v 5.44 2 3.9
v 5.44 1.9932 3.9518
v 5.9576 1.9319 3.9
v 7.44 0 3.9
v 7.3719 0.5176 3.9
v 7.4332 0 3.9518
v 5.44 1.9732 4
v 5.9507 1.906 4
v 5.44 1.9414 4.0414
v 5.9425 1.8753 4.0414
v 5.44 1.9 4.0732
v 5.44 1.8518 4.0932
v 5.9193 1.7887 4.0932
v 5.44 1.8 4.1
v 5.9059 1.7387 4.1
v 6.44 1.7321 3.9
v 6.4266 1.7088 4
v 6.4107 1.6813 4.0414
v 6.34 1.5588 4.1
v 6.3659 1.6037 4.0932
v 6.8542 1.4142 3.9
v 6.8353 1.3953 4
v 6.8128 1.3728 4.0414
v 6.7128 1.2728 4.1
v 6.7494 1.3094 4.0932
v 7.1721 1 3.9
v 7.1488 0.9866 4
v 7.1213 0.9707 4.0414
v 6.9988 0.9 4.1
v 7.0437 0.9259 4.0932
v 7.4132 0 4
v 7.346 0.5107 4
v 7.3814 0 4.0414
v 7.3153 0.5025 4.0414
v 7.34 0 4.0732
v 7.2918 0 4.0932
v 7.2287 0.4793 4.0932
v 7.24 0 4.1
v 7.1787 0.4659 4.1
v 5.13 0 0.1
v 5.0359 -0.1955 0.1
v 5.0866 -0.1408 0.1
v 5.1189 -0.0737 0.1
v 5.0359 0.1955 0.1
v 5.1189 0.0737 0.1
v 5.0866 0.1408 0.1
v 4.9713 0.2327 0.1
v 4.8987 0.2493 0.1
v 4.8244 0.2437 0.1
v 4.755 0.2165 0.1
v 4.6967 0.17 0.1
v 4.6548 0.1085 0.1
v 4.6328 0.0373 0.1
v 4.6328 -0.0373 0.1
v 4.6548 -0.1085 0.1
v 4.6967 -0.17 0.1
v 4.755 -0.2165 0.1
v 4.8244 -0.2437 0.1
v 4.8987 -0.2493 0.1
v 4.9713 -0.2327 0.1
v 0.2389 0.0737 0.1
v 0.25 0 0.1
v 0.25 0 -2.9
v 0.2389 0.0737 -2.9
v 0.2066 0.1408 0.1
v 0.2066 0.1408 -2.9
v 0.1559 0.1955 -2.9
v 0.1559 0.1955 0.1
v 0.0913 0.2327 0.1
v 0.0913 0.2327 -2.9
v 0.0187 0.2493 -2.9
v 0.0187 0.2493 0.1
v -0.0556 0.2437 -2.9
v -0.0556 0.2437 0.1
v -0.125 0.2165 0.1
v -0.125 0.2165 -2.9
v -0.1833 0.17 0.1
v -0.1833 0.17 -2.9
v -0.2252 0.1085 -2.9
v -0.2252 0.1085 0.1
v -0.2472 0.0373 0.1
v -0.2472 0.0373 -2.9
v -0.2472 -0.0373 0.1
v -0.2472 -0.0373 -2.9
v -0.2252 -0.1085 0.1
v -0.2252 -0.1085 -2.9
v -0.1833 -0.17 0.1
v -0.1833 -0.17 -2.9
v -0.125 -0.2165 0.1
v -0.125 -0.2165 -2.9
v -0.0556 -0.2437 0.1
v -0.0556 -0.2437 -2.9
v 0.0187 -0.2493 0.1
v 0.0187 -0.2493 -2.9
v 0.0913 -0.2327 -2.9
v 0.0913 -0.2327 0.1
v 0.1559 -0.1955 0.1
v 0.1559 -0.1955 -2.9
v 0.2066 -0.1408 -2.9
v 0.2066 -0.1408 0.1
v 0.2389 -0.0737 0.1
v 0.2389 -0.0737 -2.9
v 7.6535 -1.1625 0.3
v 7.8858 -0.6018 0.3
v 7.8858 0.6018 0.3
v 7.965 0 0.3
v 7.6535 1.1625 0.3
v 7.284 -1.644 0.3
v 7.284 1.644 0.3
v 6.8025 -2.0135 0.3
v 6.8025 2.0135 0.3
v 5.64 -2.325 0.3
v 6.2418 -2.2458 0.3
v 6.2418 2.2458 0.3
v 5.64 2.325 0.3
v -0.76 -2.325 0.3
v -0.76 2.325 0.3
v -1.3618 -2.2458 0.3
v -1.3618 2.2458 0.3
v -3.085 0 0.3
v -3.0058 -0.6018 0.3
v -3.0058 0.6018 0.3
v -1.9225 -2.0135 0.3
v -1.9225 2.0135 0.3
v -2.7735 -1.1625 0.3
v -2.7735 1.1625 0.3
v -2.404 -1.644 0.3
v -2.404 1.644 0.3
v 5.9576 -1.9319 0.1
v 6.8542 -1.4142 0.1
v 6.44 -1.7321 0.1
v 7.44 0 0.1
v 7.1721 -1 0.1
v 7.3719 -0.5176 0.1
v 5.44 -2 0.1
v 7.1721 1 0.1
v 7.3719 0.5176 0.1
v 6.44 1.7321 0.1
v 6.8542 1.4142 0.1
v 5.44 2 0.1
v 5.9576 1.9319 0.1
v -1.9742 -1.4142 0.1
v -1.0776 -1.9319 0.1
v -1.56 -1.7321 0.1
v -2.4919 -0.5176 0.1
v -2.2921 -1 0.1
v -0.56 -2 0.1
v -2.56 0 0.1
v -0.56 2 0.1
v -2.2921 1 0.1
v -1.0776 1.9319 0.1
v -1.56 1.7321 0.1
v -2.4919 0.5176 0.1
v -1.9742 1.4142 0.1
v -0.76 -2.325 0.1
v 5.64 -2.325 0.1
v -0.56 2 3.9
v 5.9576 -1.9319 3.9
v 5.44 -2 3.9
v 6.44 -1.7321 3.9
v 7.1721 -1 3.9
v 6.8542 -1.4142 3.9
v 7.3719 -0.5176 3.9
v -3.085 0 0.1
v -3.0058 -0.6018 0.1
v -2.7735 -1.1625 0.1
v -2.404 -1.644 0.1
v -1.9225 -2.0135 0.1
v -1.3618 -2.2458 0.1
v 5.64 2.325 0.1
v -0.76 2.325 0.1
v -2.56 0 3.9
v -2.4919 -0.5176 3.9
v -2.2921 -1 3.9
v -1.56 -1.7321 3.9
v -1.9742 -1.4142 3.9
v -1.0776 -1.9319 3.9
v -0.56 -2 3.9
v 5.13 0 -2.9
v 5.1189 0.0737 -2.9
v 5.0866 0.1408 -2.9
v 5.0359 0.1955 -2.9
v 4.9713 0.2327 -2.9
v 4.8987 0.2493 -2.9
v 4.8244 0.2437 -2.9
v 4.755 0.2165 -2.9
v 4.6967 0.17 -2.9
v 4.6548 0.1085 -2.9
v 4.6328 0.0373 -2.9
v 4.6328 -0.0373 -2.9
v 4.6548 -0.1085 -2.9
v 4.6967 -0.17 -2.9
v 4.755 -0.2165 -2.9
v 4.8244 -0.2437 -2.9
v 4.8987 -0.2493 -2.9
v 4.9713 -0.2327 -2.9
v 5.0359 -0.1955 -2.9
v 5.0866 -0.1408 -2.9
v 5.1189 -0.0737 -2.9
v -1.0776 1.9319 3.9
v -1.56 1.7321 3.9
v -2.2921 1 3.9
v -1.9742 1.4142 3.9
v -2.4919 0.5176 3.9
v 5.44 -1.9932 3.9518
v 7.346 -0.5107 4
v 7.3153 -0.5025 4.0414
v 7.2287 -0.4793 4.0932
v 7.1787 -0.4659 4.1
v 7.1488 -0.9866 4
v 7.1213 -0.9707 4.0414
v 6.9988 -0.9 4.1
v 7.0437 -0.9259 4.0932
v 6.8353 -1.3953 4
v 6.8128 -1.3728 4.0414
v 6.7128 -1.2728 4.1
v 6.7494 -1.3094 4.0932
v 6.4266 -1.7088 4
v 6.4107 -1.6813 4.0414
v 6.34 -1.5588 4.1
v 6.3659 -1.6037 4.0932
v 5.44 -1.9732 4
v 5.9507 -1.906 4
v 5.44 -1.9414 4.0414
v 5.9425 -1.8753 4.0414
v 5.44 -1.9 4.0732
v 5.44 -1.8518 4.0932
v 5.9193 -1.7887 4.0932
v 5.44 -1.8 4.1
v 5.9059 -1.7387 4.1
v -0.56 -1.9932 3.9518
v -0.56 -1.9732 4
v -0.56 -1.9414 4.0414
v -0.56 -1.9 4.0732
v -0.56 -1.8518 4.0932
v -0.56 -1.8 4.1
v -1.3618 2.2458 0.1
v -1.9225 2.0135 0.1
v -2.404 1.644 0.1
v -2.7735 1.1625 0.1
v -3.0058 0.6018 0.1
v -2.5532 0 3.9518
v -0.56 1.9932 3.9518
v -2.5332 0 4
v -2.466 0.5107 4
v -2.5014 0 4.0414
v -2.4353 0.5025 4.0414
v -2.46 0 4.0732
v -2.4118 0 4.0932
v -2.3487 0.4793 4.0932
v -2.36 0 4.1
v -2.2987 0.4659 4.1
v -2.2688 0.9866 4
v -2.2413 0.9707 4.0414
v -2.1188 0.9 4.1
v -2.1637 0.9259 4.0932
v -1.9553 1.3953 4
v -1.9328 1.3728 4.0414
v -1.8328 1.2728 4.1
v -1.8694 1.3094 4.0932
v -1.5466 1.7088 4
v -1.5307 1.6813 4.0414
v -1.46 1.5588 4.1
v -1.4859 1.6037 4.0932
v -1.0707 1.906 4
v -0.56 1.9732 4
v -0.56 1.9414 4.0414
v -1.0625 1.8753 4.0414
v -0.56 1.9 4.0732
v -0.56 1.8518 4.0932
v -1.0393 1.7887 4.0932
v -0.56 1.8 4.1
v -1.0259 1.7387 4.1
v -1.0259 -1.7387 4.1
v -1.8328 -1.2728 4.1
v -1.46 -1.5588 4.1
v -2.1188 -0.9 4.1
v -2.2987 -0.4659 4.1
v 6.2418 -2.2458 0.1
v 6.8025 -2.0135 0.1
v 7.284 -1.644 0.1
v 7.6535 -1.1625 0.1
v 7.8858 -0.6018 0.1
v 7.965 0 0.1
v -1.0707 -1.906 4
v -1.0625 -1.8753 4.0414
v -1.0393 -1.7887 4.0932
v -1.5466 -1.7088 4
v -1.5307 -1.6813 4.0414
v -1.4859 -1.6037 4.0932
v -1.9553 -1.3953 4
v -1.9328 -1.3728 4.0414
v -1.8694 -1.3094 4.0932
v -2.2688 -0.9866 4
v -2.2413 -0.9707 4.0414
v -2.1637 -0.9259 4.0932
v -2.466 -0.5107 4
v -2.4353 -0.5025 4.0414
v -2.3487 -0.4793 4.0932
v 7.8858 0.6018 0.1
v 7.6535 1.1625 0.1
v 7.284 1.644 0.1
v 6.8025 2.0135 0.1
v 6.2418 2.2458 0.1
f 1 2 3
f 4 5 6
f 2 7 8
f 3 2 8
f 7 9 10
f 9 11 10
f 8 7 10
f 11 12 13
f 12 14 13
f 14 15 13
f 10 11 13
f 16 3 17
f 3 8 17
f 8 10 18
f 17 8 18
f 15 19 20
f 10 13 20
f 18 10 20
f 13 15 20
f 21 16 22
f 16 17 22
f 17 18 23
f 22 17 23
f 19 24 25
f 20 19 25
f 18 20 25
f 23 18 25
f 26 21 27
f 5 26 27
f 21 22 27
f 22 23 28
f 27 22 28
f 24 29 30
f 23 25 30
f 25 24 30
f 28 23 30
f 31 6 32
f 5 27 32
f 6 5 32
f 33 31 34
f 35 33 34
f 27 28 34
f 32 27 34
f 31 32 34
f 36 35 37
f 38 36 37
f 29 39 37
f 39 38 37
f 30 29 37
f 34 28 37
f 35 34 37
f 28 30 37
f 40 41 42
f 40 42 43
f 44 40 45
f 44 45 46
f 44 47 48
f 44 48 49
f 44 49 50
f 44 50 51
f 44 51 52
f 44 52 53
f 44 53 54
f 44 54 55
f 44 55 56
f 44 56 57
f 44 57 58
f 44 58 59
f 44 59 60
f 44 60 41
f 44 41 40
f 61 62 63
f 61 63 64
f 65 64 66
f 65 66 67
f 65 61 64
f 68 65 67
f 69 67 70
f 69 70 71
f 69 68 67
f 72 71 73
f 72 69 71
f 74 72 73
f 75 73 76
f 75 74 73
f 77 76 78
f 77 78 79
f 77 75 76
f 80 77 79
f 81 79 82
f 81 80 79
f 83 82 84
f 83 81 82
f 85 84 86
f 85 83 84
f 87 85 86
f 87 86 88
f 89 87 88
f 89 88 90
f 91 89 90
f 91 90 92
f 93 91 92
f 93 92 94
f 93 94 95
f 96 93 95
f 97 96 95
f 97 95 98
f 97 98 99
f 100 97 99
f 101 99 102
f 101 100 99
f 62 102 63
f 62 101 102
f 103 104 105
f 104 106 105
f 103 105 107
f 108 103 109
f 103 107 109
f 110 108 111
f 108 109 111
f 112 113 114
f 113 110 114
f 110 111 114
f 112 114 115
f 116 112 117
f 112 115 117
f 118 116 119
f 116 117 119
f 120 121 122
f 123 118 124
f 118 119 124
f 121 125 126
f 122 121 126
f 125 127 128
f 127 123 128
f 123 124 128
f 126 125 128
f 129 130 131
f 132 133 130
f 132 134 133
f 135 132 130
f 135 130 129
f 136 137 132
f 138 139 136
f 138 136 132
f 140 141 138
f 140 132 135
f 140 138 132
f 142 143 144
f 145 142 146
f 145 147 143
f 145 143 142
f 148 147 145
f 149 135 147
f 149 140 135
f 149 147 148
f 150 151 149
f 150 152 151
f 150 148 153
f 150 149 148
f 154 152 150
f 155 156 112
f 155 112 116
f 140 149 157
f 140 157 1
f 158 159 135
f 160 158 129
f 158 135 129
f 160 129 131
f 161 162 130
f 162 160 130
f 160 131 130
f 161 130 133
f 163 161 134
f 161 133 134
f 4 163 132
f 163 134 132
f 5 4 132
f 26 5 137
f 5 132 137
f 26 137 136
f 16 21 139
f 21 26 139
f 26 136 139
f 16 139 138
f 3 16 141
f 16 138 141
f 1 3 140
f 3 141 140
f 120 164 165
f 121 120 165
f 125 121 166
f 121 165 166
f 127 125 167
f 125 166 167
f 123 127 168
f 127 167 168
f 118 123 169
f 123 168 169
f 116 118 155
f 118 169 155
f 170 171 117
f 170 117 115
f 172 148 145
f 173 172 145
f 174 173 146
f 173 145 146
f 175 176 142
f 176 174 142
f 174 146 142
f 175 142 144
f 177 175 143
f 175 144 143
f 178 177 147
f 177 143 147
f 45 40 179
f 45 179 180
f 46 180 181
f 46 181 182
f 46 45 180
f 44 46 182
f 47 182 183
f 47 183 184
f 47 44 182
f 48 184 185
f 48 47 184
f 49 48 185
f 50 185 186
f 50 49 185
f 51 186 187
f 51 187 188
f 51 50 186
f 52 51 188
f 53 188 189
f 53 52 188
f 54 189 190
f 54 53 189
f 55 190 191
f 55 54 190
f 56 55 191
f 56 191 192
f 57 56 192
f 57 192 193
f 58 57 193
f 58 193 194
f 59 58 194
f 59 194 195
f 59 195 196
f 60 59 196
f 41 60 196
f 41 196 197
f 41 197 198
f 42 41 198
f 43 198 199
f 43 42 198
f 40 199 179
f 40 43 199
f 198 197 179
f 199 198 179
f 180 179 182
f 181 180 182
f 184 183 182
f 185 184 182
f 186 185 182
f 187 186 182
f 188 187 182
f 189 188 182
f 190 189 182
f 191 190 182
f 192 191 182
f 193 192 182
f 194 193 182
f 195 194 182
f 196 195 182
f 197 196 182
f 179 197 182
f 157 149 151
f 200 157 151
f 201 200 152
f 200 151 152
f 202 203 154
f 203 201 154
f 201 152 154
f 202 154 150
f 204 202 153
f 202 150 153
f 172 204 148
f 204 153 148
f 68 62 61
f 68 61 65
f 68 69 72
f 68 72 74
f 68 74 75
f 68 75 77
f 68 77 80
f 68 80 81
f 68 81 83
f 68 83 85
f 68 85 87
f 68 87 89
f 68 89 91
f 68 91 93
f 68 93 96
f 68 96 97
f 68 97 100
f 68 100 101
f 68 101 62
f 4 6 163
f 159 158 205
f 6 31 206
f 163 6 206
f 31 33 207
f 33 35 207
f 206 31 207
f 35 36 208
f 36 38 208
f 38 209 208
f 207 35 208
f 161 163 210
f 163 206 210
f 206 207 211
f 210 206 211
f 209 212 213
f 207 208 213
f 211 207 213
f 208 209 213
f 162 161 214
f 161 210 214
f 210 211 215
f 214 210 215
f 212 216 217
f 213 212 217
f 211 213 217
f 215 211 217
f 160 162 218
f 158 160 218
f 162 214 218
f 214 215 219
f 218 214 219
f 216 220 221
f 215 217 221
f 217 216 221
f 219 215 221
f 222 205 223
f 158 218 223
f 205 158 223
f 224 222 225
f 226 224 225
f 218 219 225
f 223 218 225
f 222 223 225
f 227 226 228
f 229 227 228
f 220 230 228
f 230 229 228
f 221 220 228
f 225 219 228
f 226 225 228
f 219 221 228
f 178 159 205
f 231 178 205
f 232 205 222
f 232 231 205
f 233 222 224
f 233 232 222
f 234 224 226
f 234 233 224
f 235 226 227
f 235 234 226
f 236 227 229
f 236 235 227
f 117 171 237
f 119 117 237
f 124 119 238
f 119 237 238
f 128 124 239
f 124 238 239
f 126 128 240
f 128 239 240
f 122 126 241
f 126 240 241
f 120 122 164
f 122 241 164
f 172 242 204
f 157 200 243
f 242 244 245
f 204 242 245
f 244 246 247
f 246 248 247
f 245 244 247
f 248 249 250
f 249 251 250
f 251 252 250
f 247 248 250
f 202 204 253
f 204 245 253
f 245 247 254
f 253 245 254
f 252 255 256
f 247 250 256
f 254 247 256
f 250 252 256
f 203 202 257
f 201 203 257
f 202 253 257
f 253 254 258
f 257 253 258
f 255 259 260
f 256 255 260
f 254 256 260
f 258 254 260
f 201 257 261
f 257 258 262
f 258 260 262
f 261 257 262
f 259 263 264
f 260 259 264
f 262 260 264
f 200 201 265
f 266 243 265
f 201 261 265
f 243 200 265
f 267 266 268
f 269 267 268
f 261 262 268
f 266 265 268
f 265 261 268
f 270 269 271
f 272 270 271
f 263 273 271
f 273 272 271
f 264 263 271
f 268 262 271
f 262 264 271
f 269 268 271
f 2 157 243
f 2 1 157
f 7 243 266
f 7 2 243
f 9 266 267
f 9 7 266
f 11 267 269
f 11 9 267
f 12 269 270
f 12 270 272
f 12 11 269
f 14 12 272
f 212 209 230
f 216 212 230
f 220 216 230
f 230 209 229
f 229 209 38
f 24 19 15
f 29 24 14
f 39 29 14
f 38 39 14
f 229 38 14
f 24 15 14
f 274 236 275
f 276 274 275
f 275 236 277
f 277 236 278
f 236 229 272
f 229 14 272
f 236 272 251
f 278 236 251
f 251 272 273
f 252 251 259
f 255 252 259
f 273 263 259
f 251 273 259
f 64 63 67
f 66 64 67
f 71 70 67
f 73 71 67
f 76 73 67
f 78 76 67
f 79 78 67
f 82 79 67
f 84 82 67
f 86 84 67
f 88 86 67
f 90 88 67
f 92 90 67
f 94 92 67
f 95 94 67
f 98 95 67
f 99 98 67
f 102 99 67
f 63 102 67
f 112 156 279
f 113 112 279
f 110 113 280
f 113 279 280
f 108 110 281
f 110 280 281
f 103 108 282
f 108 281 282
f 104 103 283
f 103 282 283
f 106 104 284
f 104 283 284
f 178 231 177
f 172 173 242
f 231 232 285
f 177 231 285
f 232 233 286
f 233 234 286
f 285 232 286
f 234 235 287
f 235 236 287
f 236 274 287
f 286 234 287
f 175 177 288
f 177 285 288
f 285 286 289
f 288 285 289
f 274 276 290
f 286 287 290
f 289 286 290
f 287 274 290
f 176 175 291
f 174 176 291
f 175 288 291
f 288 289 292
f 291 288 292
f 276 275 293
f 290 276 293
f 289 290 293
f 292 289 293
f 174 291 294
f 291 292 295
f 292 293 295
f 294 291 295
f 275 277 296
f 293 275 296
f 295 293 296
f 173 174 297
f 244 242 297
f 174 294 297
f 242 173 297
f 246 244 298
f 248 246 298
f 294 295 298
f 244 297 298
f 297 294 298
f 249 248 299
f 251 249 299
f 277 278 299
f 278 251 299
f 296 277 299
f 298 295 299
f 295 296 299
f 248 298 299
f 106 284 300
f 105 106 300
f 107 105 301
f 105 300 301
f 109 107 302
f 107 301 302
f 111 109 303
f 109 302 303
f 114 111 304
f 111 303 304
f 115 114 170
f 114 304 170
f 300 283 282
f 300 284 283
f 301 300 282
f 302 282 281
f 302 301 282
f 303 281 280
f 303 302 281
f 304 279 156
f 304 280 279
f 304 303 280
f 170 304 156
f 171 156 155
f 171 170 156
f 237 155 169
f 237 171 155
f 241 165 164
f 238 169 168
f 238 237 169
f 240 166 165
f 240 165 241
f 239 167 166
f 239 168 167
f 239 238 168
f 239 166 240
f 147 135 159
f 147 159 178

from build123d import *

# Parameters (mm, degrees)
SKETCH_R     = 0.25
PAD_DEPTH    = 3
PAD001_DEPTH = 0.2
PAD002_DEPTH = 4
FILLET_R     = 0.2


with BuildPart() as pad:
    # Sketch → Pad (new body)
    with BuildSketch(Plane.XY.offset(0.1)):
        Circle(SKETCH_R)
        with Locations((4.88, 0)):
            Circle(SKETCH_R)
    extrude(amount=-PAD_DEPTH)


with BuildPart() as pad001:
    # Sketch001 → Pad001 (new body)
    with BuildSketch(Plane.XY.offset(0.1)):
        with BuildLine():
            Line((-0.76, 2.325), (5.64, 2.325))
            ThreePointArc((7.965, 0), (7.284023, 1.644023), (5.64, 2.325))
            ThreePointArc((5.64, -2.325), (7.284023, -1.644023), (7.965, 0))
            Line((5.64, -2.325), (-0.76, -2.325))
            ThreePointArc((-3.085, 0), (-2.404023, -1.644023), (-0.76, -2.325))
            ThreePointArc((-0.76, 2.325), (-2.404023, 1.644023), (-3.085, 0))
        make_face()
    extrude(amount=PAD001_DEPTH)


with BuildPart() as fillet_body:
    # Sketch003 → Pad002 (new body)
    with BuildSketch(Plane.XY.offset(0.1)):
        with BuildLine():
            Line((-0.56, 2), (5.44, 2))
            ThreePointArc((7.44, 0), (6.854214, 1.414214), (5.44, 2))
            ThreePointArc((5.44, -2), (6.854214, -1.414214), (7.44, 0))
            Line((5.44, -2), (-0.56, -2))
            ThreePointArc((-2.56, 0), (-1.974214, -1.414214), (-0.56, -2))
            ThreePointArc((-0.56, 2), (-1.974214, 1.414214), (-2.56, 0))
        make_face()
    extrude(amount=PAD002_DEPTH)

    # Fillet
    fillet_edges = [fillet_body.edges().sort_by_distance(p)[0] for p in [
        (2.44, 2, 4.1),
        (-1.974214, 1.414214, 4.1),
        (-1.974214, -1.414214, 4.1),
        (2.44, -2, 4.1),
        (6.854214, -1.414214, 4.1),
        (6.854214, 1.414214, 4.1),
    ]]
    fillet(fillet_edges, radius=FILLET_R)


solid = Compound([pad.part, pad001.part, fillet_body.part])
